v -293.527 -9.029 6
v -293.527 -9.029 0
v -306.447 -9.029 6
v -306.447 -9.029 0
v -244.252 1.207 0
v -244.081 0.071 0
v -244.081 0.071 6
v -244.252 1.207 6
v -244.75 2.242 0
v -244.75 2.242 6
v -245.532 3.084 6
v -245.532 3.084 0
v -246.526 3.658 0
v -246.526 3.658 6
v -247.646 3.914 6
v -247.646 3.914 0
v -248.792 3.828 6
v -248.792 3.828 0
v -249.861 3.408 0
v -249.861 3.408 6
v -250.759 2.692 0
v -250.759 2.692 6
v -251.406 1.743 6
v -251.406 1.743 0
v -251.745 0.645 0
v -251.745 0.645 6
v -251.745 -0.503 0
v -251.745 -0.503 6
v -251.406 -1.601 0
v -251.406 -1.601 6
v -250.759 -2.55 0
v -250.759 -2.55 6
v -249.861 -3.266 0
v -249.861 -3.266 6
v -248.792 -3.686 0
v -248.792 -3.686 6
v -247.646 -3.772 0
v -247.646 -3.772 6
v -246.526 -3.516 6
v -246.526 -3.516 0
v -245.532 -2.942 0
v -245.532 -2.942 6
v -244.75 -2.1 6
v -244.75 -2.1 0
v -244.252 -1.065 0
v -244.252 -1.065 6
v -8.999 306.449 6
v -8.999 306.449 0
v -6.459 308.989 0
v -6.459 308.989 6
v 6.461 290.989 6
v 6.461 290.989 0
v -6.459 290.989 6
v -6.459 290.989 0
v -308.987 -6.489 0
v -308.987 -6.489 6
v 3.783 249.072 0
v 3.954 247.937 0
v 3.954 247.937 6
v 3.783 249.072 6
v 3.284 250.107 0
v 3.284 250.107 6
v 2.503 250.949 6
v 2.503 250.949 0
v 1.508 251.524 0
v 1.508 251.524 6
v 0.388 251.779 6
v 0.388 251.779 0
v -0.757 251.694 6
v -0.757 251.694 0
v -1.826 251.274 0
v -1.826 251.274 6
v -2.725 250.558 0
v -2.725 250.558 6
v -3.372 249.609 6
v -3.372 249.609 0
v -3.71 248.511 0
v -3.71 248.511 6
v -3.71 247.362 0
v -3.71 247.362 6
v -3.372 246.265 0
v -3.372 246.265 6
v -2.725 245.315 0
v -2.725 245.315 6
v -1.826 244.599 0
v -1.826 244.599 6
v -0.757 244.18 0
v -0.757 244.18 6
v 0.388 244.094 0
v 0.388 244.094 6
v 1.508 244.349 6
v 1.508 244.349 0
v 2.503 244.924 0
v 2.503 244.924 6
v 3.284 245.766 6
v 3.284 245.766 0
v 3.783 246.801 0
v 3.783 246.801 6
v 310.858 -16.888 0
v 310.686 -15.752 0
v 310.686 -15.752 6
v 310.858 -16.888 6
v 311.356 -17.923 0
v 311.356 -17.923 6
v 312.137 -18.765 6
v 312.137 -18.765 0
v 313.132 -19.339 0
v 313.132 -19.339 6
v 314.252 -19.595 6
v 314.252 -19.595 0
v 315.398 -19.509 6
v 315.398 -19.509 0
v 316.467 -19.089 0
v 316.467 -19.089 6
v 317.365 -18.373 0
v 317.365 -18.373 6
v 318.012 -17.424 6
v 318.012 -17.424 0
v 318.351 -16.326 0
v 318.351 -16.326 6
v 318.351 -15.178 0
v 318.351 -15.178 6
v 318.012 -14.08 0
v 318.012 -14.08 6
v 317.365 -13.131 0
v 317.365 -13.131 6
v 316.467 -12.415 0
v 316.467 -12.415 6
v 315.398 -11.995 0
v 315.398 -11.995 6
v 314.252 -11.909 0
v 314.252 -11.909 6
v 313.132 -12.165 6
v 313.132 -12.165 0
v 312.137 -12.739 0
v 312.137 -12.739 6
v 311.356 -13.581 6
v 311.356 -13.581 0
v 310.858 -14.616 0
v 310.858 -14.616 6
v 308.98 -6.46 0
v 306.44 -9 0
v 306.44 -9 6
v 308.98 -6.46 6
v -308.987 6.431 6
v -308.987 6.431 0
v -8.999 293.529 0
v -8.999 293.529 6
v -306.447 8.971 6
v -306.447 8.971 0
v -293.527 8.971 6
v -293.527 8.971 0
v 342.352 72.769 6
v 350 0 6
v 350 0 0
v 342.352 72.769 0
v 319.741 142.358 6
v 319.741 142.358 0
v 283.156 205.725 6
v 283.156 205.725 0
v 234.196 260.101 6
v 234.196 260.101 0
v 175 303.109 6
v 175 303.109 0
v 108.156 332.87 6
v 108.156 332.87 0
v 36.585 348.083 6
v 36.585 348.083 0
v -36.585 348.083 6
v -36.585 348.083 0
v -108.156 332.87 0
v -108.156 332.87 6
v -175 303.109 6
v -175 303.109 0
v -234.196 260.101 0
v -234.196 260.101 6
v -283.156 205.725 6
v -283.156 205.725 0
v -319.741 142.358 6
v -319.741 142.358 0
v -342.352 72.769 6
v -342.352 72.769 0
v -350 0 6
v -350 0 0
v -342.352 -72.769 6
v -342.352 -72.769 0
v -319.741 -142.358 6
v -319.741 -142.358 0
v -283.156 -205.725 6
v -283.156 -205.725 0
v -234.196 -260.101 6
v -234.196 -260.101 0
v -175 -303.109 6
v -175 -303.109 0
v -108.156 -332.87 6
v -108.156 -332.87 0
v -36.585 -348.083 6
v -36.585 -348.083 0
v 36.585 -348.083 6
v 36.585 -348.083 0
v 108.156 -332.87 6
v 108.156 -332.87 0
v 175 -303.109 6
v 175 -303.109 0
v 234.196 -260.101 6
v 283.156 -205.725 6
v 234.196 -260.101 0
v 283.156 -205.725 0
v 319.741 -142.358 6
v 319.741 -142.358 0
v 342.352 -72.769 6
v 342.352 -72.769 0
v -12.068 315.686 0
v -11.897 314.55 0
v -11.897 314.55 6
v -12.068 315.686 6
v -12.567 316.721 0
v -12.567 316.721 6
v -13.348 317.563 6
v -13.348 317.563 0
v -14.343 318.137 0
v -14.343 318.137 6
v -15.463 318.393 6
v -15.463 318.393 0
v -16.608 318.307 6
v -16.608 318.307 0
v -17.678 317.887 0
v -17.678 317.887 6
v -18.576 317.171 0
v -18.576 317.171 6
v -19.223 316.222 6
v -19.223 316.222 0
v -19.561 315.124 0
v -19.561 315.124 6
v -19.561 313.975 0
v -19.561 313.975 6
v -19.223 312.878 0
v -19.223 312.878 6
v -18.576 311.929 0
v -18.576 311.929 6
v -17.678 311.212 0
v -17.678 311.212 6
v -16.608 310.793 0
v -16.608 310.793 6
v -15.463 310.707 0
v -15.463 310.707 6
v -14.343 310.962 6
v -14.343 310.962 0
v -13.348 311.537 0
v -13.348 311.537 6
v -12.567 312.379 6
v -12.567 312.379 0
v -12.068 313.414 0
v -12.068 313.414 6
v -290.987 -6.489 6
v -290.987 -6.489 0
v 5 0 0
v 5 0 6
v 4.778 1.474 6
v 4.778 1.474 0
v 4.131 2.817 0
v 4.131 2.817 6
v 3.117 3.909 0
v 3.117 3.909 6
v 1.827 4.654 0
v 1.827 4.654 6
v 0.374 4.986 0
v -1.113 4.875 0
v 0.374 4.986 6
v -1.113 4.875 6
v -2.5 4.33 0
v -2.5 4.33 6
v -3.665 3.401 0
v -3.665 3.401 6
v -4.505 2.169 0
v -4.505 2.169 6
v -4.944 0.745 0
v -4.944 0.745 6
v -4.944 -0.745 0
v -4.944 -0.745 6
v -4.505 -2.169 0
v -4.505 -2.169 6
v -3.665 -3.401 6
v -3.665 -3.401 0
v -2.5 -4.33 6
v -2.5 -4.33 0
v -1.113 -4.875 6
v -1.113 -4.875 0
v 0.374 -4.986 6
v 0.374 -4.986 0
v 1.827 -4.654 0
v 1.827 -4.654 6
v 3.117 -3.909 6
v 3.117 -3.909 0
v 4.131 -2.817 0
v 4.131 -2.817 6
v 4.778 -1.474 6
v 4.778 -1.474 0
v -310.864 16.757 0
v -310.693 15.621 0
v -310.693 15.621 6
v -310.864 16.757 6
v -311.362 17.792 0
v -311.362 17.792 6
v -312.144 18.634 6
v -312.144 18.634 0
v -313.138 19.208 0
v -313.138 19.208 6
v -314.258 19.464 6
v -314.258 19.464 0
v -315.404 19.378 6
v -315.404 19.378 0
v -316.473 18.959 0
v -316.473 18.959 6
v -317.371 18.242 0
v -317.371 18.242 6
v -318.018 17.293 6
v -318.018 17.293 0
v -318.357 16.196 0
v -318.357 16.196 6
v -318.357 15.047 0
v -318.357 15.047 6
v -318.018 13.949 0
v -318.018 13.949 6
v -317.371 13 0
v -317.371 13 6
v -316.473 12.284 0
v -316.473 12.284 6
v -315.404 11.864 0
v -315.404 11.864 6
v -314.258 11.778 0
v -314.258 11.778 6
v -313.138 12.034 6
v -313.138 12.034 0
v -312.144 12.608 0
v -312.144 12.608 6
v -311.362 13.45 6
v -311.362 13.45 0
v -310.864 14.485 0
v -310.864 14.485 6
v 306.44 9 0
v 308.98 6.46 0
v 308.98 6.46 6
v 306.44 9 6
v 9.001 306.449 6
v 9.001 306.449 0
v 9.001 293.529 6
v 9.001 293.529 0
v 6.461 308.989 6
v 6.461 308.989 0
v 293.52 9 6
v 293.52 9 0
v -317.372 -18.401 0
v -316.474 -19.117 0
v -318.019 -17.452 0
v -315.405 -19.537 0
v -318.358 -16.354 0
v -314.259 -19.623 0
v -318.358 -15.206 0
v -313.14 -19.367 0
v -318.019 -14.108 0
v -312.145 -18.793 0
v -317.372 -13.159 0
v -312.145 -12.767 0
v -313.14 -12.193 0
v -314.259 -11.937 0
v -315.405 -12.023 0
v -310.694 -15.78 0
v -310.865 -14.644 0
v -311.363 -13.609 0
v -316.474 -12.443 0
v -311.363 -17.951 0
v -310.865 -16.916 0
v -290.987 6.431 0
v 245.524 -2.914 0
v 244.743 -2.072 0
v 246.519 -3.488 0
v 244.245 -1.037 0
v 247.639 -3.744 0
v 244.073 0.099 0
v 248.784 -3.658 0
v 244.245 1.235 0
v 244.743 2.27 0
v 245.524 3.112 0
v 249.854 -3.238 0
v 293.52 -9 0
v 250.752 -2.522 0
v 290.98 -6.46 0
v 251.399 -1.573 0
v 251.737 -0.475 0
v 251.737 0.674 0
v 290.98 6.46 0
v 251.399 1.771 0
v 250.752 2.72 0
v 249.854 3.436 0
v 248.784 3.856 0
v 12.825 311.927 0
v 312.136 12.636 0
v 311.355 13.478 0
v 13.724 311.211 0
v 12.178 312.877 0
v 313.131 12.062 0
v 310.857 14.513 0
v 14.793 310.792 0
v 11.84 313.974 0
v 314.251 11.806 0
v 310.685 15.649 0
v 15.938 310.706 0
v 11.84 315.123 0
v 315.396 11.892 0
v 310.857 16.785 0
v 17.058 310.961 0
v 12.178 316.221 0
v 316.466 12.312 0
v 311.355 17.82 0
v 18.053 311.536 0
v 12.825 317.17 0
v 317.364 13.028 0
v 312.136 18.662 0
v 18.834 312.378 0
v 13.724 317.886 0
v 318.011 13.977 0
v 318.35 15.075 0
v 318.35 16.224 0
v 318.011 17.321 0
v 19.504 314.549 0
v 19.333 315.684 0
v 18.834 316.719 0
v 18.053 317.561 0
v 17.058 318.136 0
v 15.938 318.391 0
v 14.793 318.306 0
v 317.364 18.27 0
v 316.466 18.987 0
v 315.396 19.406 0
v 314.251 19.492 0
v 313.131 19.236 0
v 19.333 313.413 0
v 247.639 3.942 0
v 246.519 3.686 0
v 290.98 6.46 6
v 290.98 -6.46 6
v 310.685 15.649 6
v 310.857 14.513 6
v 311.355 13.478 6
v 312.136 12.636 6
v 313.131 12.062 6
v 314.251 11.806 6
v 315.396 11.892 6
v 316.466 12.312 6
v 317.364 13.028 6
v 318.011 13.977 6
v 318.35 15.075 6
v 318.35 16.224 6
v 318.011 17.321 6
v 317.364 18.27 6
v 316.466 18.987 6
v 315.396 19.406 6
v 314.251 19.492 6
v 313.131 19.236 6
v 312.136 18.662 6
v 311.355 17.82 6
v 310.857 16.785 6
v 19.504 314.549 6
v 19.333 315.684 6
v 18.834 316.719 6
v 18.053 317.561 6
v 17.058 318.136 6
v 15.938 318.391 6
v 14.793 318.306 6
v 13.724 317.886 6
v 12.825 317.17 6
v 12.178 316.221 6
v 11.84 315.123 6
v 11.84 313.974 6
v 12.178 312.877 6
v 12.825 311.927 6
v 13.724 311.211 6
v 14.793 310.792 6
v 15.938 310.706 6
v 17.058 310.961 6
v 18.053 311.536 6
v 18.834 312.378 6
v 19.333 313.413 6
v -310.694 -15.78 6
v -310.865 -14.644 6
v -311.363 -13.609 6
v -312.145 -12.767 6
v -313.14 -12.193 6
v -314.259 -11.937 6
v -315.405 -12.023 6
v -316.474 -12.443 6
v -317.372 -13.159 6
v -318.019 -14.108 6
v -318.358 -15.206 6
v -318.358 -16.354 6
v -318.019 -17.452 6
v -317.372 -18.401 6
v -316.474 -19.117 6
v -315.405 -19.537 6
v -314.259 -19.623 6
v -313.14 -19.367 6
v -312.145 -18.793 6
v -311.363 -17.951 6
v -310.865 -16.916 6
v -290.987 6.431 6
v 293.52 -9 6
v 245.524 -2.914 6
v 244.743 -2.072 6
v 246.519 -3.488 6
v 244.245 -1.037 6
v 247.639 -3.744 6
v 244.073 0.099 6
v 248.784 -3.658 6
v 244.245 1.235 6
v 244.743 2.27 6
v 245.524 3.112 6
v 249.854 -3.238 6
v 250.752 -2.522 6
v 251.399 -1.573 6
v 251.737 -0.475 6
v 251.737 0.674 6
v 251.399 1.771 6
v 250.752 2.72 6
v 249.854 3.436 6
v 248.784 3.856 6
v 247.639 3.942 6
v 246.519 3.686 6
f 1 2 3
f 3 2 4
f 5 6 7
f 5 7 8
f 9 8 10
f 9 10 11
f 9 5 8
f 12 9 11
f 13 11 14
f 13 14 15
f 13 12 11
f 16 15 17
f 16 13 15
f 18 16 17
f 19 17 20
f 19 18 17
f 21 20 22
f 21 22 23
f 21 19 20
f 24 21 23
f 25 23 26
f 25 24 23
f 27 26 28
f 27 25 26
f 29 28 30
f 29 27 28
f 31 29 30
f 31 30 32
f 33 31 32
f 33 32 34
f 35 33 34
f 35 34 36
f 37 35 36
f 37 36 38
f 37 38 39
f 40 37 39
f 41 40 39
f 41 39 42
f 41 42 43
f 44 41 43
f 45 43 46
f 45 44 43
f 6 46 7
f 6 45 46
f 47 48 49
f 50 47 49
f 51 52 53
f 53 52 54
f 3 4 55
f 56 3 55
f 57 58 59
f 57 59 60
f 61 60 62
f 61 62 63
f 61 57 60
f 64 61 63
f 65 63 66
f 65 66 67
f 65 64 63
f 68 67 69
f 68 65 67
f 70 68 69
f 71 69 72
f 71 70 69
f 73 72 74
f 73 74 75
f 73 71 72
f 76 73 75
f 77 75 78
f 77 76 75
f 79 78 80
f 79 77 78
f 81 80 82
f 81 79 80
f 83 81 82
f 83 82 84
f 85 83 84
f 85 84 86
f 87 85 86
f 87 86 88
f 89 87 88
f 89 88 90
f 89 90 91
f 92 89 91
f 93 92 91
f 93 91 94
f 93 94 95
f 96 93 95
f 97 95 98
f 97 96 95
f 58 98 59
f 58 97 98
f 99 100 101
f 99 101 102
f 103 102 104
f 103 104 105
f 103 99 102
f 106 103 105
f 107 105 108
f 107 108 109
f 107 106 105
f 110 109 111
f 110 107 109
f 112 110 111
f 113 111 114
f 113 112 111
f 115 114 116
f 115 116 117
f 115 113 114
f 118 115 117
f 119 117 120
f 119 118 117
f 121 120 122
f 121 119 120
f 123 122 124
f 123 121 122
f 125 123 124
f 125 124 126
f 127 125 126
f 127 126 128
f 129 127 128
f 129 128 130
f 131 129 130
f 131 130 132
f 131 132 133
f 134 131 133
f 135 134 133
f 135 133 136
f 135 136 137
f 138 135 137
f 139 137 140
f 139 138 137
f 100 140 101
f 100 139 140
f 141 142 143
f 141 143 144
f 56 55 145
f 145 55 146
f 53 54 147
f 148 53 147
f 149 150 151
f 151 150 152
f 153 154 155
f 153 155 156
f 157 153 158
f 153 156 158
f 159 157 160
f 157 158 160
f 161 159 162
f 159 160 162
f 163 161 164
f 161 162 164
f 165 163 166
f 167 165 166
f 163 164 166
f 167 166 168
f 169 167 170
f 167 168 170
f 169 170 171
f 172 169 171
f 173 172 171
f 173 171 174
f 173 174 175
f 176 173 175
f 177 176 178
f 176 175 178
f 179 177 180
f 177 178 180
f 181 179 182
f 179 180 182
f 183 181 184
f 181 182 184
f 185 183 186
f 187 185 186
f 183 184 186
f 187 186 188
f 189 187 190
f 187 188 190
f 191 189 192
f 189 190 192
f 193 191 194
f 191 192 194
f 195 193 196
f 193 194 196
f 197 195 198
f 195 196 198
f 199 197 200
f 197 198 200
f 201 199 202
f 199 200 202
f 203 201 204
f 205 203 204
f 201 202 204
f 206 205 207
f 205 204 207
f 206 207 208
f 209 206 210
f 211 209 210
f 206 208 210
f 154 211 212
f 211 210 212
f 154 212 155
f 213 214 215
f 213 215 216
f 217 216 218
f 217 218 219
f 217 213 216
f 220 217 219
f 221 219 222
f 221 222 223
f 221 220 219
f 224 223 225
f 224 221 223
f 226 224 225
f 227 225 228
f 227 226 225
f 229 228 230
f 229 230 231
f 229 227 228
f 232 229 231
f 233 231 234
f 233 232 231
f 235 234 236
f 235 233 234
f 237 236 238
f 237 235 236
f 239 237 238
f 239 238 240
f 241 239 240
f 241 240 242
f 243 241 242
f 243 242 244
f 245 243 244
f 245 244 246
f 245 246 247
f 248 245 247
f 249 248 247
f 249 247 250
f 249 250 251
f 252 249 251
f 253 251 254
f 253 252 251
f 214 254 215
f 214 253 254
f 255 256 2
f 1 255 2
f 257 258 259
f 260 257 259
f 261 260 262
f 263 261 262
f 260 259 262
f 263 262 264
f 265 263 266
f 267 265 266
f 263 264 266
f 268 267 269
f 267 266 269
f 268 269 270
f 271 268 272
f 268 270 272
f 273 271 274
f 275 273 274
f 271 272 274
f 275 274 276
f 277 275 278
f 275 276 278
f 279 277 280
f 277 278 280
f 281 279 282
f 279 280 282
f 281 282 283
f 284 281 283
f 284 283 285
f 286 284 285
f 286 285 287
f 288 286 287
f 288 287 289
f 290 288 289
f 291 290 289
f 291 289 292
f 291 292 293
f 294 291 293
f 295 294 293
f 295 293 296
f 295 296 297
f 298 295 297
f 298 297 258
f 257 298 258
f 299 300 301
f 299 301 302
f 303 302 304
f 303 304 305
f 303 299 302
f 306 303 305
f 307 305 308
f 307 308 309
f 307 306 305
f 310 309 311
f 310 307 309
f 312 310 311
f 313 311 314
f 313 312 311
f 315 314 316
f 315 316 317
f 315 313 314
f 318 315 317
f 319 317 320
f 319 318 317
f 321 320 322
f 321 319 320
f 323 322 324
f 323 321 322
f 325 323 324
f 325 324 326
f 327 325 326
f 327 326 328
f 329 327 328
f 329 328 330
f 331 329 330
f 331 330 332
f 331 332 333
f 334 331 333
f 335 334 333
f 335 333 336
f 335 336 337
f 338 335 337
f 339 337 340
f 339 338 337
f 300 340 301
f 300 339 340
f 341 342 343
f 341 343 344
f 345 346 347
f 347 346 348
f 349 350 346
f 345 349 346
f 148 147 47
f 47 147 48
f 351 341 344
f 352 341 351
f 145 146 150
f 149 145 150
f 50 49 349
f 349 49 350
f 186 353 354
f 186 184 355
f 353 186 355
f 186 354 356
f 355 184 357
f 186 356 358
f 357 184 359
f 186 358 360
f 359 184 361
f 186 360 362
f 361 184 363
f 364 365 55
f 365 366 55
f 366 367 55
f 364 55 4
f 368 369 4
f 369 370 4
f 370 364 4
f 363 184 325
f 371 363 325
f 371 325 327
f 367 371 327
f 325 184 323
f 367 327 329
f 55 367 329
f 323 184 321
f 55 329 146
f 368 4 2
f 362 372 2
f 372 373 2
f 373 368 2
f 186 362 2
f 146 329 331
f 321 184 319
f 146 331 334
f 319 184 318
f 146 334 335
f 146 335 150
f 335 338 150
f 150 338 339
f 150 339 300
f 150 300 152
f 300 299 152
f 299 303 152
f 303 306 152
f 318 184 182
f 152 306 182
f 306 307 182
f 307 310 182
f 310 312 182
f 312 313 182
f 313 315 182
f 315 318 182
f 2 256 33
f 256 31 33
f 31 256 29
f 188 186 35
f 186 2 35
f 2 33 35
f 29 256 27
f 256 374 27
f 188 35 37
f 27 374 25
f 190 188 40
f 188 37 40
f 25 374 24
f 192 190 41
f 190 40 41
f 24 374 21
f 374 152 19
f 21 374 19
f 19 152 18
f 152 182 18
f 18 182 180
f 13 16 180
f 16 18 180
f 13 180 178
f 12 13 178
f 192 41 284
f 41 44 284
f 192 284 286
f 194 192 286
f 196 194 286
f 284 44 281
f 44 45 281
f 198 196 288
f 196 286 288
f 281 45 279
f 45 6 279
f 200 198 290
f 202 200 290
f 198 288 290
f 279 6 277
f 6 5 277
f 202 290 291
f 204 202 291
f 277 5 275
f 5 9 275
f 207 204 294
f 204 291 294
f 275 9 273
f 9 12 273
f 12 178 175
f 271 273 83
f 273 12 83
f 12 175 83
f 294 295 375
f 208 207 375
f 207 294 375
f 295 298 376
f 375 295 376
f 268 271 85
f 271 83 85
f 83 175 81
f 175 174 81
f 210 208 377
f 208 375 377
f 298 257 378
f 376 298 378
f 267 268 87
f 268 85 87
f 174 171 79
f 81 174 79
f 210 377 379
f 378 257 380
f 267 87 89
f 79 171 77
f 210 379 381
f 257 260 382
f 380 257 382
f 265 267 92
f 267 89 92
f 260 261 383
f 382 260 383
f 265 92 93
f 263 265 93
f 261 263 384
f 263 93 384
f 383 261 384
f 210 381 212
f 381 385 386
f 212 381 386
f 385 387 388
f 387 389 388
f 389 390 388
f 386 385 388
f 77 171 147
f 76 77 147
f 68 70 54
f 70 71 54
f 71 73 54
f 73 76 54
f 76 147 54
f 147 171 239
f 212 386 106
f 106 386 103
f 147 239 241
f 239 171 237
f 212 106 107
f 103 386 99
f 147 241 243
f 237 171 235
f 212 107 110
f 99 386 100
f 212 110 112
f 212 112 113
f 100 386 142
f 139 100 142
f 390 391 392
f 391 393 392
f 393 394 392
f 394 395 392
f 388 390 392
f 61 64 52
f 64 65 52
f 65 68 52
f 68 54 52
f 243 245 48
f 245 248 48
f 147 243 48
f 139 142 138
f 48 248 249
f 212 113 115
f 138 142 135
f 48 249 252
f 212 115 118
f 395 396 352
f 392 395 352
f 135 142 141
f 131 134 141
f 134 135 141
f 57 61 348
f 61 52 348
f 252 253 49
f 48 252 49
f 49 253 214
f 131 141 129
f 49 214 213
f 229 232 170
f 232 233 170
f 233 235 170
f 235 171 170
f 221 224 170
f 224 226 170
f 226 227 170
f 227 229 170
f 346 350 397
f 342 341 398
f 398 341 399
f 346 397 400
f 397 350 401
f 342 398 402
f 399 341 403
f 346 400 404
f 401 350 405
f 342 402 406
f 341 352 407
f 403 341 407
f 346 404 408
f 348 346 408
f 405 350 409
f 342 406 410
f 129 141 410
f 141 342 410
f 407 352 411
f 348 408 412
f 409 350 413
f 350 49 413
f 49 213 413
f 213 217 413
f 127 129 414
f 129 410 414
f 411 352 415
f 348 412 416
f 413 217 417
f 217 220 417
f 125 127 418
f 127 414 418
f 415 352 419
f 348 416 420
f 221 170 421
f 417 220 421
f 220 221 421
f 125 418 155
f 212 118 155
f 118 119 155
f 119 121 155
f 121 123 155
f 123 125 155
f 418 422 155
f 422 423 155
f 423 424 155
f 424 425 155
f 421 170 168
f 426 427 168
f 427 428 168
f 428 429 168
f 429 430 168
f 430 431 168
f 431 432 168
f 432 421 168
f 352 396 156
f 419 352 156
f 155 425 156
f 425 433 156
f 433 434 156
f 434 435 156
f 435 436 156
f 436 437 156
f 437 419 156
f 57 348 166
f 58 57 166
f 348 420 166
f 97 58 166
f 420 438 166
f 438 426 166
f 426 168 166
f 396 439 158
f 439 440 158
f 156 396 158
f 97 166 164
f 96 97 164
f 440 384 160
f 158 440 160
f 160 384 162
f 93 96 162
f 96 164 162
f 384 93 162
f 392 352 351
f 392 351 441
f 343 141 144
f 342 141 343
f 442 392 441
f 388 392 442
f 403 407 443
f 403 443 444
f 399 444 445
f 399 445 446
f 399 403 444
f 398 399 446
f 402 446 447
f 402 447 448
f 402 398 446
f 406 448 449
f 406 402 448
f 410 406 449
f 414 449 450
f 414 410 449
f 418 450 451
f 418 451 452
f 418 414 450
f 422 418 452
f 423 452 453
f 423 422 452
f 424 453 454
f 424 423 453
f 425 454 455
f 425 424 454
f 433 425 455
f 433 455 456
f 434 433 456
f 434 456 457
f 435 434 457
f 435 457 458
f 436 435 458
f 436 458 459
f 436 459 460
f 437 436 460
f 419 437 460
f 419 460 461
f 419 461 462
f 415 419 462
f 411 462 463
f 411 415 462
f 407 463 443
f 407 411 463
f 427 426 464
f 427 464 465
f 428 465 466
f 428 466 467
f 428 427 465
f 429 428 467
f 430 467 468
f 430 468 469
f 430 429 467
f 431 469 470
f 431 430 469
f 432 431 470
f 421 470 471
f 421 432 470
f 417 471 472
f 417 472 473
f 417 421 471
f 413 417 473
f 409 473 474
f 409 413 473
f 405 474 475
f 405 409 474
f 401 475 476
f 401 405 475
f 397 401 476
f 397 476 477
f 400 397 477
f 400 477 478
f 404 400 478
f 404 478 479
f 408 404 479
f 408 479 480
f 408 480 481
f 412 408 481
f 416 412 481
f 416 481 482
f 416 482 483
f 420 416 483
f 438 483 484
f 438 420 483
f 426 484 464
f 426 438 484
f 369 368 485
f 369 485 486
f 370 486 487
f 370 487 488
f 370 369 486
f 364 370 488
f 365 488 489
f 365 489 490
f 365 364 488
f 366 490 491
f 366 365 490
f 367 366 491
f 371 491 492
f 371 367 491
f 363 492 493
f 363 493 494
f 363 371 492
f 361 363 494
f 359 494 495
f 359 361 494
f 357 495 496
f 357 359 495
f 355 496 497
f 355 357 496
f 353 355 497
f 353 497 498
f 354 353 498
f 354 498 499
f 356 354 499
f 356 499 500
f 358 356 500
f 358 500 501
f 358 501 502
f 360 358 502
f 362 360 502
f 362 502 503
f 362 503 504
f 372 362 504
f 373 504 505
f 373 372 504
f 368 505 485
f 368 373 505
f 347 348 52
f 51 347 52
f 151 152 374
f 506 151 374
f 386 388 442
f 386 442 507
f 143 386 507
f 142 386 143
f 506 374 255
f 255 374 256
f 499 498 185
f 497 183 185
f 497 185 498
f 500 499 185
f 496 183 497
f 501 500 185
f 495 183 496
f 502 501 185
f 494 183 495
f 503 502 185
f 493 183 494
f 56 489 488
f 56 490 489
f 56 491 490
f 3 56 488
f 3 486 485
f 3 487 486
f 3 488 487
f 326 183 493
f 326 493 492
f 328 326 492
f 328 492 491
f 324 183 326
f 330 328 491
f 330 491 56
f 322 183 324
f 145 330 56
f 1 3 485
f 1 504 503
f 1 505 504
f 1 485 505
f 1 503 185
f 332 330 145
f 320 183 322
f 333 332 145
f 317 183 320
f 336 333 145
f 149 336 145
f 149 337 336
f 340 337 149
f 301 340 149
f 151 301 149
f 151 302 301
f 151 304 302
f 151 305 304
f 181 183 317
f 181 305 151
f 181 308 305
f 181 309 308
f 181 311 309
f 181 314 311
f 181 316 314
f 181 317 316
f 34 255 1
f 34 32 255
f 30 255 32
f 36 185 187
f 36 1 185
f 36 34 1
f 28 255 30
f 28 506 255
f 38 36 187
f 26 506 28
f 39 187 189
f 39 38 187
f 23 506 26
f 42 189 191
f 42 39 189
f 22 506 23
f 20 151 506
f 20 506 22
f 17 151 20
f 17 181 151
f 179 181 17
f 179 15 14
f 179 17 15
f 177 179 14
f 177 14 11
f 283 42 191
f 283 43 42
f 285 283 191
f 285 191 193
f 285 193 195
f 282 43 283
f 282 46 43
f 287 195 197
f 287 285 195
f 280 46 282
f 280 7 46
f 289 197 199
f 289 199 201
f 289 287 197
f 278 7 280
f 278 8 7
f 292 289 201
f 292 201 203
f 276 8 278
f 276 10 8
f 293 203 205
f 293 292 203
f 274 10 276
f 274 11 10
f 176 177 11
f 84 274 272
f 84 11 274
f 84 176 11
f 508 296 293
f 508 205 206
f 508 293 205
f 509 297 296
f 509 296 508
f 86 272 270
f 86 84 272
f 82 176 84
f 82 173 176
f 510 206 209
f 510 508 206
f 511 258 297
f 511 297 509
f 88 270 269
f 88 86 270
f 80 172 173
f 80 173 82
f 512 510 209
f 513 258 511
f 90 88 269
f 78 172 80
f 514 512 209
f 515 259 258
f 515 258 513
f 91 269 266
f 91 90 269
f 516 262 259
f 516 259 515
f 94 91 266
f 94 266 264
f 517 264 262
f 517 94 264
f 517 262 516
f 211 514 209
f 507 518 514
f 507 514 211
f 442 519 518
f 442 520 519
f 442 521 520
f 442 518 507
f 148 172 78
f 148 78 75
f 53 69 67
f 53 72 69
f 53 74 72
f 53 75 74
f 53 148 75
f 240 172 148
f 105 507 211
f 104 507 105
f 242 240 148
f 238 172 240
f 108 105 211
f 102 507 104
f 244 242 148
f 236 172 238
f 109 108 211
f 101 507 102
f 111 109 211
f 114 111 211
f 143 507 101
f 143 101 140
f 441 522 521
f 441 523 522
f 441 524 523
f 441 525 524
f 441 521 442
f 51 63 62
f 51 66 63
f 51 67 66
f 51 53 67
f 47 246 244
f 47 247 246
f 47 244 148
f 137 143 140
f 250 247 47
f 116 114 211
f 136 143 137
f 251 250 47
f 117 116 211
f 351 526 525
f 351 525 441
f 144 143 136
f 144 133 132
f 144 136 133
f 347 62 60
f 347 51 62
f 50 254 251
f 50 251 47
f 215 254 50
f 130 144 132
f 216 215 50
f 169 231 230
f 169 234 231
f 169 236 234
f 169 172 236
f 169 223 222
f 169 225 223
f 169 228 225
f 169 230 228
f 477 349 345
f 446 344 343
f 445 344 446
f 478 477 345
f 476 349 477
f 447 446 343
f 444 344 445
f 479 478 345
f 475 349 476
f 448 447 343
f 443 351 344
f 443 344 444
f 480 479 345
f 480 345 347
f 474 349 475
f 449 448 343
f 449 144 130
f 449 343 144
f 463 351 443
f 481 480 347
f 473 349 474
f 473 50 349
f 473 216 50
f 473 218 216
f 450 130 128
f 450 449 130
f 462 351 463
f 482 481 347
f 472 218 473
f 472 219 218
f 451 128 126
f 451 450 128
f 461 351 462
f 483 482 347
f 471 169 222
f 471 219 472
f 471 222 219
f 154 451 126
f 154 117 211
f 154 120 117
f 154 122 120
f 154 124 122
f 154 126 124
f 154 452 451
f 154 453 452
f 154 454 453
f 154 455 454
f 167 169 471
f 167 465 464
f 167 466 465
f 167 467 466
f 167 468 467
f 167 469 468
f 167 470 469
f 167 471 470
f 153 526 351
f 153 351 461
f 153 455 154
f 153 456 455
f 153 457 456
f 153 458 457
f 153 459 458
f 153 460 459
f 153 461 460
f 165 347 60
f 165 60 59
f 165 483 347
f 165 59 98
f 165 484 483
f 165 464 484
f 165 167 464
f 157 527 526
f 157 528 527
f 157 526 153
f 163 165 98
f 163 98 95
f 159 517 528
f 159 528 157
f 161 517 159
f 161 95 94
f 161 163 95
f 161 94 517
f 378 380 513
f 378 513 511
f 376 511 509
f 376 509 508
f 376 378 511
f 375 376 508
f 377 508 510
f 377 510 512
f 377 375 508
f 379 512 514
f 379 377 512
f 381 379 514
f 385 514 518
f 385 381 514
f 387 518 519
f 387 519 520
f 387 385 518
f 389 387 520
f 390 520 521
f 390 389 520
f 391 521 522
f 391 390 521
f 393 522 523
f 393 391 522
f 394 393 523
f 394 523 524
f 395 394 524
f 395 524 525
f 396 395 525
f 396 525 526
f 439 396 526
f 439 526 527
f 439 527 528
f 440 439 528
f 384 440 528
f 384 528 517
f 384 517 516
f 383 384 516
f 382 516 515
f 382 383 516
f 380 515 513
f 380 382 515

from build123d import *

# Parameters (mm, degrees)
SKETCH1_R           = 350
SKETCH1_R_2         = 3.853599608
BOSS_EXTRUDE1_DEPTH = 6
SKETCH3_R           = 5
CUT_EXTRUDE1_DEPTH  = 23


with BuildPart() as part:
    # Sketch1 → Boss-Extrude1 (new body)
    with BuildSketch(Plane.XY):
        Circle(SKETCH1_R)
        with Locations((-15.75089486, 314.549698435)):
            Circle(SKETCH1_R_2, mode=Mode.SUBTRACT)
        with Locations((15.650361768, 314.54857996)):
            Circle(SKETCH1_R_2, mode=Mode.SUBTRACT)
        with Locations((0.100305228, 247.936525061)):
            Circle(SKETCH1_R_2, mode=Mode.SUBTRACT)
        with Locations((-314.54747334, -15.780069307)):
            Circle(SKETCH1_R_2, mode=Mode.SUBTRACT)
        with Locations((-314.546354865, 15.621187321)):
            Circle(SKETCH1_R_2, mode=Mode.SUBTRACT)
        with Locations((-247.934299965, 0.071130781)):
            Circle(SKETCH1_R_2, mode=Mode.SUBTRACT)
        with Locations(Location((247.926914103, 0.099183743, 0), (0, 0, 180))):
            Circle(SKETCH1_R_2, mode=Mode.SUBTRACT)
        with Locations(Location((314.538969003, 15.649240284, 0), (0, 0, 180))):
            Circle(SKETCH1_R_2, mode=Mode.SUBTRACT)
        with Locations(Location((314.540087478, -15.752016345, 0), (0, 0, 180))):
            Circle(SKETCH1_R_2, mode=Mode.SUBTRACT)
        Polygon((9.000621865, 306.449460756), (9.000621865, 293.529460756), (6.460621865, 290.989460756), (-6.459378135, 290.989460756), (-8.999378135, 293.529460756), (-8.999378135, 306.449460756), (-6.459378135, 308.989460756), (6.460621865, 308.989460756), align=None, mode=Mode.SUBTRACT)
        Polygon((-306.44723566, 8.971447418), (-293.52723566, 8.971447418), (-290.98723566, 6.431447418), (-290.98723566, -6.488552582), (-293.52723566, -9.028552582), (-306.44723566, -9.028552582), (-308.98723566, -6.488552582), (-308.98723566, 6.431447418), align=None, mode=Mode.SUBTRACT)
        Polygon((308.979849798, 6.459500381), (306.439849798, 8.999500381), (293.519849798, 8.999500381), (290.979849798, 6.459500381), (290.979849798, -6.460499619), (293.519849798, -9.000499619), (306.439849798, -9.000499619), (308.979849798, -6.460499619), align=None, mode=Mode.SUBTRACT)
    extrude(amount=BOSS_EXTRUDE1_DEPTH)

    # Sketch3 → Cut-Extrude1 (cut)
    with BuildSketch(Plane.XY.offset(6)):
        Circle(SKETCH3_R)
    extrude(amount=-CUT_EXTRUDE1_DEPTH, mode=Mode.SUBTRACT)


solid = part.part
